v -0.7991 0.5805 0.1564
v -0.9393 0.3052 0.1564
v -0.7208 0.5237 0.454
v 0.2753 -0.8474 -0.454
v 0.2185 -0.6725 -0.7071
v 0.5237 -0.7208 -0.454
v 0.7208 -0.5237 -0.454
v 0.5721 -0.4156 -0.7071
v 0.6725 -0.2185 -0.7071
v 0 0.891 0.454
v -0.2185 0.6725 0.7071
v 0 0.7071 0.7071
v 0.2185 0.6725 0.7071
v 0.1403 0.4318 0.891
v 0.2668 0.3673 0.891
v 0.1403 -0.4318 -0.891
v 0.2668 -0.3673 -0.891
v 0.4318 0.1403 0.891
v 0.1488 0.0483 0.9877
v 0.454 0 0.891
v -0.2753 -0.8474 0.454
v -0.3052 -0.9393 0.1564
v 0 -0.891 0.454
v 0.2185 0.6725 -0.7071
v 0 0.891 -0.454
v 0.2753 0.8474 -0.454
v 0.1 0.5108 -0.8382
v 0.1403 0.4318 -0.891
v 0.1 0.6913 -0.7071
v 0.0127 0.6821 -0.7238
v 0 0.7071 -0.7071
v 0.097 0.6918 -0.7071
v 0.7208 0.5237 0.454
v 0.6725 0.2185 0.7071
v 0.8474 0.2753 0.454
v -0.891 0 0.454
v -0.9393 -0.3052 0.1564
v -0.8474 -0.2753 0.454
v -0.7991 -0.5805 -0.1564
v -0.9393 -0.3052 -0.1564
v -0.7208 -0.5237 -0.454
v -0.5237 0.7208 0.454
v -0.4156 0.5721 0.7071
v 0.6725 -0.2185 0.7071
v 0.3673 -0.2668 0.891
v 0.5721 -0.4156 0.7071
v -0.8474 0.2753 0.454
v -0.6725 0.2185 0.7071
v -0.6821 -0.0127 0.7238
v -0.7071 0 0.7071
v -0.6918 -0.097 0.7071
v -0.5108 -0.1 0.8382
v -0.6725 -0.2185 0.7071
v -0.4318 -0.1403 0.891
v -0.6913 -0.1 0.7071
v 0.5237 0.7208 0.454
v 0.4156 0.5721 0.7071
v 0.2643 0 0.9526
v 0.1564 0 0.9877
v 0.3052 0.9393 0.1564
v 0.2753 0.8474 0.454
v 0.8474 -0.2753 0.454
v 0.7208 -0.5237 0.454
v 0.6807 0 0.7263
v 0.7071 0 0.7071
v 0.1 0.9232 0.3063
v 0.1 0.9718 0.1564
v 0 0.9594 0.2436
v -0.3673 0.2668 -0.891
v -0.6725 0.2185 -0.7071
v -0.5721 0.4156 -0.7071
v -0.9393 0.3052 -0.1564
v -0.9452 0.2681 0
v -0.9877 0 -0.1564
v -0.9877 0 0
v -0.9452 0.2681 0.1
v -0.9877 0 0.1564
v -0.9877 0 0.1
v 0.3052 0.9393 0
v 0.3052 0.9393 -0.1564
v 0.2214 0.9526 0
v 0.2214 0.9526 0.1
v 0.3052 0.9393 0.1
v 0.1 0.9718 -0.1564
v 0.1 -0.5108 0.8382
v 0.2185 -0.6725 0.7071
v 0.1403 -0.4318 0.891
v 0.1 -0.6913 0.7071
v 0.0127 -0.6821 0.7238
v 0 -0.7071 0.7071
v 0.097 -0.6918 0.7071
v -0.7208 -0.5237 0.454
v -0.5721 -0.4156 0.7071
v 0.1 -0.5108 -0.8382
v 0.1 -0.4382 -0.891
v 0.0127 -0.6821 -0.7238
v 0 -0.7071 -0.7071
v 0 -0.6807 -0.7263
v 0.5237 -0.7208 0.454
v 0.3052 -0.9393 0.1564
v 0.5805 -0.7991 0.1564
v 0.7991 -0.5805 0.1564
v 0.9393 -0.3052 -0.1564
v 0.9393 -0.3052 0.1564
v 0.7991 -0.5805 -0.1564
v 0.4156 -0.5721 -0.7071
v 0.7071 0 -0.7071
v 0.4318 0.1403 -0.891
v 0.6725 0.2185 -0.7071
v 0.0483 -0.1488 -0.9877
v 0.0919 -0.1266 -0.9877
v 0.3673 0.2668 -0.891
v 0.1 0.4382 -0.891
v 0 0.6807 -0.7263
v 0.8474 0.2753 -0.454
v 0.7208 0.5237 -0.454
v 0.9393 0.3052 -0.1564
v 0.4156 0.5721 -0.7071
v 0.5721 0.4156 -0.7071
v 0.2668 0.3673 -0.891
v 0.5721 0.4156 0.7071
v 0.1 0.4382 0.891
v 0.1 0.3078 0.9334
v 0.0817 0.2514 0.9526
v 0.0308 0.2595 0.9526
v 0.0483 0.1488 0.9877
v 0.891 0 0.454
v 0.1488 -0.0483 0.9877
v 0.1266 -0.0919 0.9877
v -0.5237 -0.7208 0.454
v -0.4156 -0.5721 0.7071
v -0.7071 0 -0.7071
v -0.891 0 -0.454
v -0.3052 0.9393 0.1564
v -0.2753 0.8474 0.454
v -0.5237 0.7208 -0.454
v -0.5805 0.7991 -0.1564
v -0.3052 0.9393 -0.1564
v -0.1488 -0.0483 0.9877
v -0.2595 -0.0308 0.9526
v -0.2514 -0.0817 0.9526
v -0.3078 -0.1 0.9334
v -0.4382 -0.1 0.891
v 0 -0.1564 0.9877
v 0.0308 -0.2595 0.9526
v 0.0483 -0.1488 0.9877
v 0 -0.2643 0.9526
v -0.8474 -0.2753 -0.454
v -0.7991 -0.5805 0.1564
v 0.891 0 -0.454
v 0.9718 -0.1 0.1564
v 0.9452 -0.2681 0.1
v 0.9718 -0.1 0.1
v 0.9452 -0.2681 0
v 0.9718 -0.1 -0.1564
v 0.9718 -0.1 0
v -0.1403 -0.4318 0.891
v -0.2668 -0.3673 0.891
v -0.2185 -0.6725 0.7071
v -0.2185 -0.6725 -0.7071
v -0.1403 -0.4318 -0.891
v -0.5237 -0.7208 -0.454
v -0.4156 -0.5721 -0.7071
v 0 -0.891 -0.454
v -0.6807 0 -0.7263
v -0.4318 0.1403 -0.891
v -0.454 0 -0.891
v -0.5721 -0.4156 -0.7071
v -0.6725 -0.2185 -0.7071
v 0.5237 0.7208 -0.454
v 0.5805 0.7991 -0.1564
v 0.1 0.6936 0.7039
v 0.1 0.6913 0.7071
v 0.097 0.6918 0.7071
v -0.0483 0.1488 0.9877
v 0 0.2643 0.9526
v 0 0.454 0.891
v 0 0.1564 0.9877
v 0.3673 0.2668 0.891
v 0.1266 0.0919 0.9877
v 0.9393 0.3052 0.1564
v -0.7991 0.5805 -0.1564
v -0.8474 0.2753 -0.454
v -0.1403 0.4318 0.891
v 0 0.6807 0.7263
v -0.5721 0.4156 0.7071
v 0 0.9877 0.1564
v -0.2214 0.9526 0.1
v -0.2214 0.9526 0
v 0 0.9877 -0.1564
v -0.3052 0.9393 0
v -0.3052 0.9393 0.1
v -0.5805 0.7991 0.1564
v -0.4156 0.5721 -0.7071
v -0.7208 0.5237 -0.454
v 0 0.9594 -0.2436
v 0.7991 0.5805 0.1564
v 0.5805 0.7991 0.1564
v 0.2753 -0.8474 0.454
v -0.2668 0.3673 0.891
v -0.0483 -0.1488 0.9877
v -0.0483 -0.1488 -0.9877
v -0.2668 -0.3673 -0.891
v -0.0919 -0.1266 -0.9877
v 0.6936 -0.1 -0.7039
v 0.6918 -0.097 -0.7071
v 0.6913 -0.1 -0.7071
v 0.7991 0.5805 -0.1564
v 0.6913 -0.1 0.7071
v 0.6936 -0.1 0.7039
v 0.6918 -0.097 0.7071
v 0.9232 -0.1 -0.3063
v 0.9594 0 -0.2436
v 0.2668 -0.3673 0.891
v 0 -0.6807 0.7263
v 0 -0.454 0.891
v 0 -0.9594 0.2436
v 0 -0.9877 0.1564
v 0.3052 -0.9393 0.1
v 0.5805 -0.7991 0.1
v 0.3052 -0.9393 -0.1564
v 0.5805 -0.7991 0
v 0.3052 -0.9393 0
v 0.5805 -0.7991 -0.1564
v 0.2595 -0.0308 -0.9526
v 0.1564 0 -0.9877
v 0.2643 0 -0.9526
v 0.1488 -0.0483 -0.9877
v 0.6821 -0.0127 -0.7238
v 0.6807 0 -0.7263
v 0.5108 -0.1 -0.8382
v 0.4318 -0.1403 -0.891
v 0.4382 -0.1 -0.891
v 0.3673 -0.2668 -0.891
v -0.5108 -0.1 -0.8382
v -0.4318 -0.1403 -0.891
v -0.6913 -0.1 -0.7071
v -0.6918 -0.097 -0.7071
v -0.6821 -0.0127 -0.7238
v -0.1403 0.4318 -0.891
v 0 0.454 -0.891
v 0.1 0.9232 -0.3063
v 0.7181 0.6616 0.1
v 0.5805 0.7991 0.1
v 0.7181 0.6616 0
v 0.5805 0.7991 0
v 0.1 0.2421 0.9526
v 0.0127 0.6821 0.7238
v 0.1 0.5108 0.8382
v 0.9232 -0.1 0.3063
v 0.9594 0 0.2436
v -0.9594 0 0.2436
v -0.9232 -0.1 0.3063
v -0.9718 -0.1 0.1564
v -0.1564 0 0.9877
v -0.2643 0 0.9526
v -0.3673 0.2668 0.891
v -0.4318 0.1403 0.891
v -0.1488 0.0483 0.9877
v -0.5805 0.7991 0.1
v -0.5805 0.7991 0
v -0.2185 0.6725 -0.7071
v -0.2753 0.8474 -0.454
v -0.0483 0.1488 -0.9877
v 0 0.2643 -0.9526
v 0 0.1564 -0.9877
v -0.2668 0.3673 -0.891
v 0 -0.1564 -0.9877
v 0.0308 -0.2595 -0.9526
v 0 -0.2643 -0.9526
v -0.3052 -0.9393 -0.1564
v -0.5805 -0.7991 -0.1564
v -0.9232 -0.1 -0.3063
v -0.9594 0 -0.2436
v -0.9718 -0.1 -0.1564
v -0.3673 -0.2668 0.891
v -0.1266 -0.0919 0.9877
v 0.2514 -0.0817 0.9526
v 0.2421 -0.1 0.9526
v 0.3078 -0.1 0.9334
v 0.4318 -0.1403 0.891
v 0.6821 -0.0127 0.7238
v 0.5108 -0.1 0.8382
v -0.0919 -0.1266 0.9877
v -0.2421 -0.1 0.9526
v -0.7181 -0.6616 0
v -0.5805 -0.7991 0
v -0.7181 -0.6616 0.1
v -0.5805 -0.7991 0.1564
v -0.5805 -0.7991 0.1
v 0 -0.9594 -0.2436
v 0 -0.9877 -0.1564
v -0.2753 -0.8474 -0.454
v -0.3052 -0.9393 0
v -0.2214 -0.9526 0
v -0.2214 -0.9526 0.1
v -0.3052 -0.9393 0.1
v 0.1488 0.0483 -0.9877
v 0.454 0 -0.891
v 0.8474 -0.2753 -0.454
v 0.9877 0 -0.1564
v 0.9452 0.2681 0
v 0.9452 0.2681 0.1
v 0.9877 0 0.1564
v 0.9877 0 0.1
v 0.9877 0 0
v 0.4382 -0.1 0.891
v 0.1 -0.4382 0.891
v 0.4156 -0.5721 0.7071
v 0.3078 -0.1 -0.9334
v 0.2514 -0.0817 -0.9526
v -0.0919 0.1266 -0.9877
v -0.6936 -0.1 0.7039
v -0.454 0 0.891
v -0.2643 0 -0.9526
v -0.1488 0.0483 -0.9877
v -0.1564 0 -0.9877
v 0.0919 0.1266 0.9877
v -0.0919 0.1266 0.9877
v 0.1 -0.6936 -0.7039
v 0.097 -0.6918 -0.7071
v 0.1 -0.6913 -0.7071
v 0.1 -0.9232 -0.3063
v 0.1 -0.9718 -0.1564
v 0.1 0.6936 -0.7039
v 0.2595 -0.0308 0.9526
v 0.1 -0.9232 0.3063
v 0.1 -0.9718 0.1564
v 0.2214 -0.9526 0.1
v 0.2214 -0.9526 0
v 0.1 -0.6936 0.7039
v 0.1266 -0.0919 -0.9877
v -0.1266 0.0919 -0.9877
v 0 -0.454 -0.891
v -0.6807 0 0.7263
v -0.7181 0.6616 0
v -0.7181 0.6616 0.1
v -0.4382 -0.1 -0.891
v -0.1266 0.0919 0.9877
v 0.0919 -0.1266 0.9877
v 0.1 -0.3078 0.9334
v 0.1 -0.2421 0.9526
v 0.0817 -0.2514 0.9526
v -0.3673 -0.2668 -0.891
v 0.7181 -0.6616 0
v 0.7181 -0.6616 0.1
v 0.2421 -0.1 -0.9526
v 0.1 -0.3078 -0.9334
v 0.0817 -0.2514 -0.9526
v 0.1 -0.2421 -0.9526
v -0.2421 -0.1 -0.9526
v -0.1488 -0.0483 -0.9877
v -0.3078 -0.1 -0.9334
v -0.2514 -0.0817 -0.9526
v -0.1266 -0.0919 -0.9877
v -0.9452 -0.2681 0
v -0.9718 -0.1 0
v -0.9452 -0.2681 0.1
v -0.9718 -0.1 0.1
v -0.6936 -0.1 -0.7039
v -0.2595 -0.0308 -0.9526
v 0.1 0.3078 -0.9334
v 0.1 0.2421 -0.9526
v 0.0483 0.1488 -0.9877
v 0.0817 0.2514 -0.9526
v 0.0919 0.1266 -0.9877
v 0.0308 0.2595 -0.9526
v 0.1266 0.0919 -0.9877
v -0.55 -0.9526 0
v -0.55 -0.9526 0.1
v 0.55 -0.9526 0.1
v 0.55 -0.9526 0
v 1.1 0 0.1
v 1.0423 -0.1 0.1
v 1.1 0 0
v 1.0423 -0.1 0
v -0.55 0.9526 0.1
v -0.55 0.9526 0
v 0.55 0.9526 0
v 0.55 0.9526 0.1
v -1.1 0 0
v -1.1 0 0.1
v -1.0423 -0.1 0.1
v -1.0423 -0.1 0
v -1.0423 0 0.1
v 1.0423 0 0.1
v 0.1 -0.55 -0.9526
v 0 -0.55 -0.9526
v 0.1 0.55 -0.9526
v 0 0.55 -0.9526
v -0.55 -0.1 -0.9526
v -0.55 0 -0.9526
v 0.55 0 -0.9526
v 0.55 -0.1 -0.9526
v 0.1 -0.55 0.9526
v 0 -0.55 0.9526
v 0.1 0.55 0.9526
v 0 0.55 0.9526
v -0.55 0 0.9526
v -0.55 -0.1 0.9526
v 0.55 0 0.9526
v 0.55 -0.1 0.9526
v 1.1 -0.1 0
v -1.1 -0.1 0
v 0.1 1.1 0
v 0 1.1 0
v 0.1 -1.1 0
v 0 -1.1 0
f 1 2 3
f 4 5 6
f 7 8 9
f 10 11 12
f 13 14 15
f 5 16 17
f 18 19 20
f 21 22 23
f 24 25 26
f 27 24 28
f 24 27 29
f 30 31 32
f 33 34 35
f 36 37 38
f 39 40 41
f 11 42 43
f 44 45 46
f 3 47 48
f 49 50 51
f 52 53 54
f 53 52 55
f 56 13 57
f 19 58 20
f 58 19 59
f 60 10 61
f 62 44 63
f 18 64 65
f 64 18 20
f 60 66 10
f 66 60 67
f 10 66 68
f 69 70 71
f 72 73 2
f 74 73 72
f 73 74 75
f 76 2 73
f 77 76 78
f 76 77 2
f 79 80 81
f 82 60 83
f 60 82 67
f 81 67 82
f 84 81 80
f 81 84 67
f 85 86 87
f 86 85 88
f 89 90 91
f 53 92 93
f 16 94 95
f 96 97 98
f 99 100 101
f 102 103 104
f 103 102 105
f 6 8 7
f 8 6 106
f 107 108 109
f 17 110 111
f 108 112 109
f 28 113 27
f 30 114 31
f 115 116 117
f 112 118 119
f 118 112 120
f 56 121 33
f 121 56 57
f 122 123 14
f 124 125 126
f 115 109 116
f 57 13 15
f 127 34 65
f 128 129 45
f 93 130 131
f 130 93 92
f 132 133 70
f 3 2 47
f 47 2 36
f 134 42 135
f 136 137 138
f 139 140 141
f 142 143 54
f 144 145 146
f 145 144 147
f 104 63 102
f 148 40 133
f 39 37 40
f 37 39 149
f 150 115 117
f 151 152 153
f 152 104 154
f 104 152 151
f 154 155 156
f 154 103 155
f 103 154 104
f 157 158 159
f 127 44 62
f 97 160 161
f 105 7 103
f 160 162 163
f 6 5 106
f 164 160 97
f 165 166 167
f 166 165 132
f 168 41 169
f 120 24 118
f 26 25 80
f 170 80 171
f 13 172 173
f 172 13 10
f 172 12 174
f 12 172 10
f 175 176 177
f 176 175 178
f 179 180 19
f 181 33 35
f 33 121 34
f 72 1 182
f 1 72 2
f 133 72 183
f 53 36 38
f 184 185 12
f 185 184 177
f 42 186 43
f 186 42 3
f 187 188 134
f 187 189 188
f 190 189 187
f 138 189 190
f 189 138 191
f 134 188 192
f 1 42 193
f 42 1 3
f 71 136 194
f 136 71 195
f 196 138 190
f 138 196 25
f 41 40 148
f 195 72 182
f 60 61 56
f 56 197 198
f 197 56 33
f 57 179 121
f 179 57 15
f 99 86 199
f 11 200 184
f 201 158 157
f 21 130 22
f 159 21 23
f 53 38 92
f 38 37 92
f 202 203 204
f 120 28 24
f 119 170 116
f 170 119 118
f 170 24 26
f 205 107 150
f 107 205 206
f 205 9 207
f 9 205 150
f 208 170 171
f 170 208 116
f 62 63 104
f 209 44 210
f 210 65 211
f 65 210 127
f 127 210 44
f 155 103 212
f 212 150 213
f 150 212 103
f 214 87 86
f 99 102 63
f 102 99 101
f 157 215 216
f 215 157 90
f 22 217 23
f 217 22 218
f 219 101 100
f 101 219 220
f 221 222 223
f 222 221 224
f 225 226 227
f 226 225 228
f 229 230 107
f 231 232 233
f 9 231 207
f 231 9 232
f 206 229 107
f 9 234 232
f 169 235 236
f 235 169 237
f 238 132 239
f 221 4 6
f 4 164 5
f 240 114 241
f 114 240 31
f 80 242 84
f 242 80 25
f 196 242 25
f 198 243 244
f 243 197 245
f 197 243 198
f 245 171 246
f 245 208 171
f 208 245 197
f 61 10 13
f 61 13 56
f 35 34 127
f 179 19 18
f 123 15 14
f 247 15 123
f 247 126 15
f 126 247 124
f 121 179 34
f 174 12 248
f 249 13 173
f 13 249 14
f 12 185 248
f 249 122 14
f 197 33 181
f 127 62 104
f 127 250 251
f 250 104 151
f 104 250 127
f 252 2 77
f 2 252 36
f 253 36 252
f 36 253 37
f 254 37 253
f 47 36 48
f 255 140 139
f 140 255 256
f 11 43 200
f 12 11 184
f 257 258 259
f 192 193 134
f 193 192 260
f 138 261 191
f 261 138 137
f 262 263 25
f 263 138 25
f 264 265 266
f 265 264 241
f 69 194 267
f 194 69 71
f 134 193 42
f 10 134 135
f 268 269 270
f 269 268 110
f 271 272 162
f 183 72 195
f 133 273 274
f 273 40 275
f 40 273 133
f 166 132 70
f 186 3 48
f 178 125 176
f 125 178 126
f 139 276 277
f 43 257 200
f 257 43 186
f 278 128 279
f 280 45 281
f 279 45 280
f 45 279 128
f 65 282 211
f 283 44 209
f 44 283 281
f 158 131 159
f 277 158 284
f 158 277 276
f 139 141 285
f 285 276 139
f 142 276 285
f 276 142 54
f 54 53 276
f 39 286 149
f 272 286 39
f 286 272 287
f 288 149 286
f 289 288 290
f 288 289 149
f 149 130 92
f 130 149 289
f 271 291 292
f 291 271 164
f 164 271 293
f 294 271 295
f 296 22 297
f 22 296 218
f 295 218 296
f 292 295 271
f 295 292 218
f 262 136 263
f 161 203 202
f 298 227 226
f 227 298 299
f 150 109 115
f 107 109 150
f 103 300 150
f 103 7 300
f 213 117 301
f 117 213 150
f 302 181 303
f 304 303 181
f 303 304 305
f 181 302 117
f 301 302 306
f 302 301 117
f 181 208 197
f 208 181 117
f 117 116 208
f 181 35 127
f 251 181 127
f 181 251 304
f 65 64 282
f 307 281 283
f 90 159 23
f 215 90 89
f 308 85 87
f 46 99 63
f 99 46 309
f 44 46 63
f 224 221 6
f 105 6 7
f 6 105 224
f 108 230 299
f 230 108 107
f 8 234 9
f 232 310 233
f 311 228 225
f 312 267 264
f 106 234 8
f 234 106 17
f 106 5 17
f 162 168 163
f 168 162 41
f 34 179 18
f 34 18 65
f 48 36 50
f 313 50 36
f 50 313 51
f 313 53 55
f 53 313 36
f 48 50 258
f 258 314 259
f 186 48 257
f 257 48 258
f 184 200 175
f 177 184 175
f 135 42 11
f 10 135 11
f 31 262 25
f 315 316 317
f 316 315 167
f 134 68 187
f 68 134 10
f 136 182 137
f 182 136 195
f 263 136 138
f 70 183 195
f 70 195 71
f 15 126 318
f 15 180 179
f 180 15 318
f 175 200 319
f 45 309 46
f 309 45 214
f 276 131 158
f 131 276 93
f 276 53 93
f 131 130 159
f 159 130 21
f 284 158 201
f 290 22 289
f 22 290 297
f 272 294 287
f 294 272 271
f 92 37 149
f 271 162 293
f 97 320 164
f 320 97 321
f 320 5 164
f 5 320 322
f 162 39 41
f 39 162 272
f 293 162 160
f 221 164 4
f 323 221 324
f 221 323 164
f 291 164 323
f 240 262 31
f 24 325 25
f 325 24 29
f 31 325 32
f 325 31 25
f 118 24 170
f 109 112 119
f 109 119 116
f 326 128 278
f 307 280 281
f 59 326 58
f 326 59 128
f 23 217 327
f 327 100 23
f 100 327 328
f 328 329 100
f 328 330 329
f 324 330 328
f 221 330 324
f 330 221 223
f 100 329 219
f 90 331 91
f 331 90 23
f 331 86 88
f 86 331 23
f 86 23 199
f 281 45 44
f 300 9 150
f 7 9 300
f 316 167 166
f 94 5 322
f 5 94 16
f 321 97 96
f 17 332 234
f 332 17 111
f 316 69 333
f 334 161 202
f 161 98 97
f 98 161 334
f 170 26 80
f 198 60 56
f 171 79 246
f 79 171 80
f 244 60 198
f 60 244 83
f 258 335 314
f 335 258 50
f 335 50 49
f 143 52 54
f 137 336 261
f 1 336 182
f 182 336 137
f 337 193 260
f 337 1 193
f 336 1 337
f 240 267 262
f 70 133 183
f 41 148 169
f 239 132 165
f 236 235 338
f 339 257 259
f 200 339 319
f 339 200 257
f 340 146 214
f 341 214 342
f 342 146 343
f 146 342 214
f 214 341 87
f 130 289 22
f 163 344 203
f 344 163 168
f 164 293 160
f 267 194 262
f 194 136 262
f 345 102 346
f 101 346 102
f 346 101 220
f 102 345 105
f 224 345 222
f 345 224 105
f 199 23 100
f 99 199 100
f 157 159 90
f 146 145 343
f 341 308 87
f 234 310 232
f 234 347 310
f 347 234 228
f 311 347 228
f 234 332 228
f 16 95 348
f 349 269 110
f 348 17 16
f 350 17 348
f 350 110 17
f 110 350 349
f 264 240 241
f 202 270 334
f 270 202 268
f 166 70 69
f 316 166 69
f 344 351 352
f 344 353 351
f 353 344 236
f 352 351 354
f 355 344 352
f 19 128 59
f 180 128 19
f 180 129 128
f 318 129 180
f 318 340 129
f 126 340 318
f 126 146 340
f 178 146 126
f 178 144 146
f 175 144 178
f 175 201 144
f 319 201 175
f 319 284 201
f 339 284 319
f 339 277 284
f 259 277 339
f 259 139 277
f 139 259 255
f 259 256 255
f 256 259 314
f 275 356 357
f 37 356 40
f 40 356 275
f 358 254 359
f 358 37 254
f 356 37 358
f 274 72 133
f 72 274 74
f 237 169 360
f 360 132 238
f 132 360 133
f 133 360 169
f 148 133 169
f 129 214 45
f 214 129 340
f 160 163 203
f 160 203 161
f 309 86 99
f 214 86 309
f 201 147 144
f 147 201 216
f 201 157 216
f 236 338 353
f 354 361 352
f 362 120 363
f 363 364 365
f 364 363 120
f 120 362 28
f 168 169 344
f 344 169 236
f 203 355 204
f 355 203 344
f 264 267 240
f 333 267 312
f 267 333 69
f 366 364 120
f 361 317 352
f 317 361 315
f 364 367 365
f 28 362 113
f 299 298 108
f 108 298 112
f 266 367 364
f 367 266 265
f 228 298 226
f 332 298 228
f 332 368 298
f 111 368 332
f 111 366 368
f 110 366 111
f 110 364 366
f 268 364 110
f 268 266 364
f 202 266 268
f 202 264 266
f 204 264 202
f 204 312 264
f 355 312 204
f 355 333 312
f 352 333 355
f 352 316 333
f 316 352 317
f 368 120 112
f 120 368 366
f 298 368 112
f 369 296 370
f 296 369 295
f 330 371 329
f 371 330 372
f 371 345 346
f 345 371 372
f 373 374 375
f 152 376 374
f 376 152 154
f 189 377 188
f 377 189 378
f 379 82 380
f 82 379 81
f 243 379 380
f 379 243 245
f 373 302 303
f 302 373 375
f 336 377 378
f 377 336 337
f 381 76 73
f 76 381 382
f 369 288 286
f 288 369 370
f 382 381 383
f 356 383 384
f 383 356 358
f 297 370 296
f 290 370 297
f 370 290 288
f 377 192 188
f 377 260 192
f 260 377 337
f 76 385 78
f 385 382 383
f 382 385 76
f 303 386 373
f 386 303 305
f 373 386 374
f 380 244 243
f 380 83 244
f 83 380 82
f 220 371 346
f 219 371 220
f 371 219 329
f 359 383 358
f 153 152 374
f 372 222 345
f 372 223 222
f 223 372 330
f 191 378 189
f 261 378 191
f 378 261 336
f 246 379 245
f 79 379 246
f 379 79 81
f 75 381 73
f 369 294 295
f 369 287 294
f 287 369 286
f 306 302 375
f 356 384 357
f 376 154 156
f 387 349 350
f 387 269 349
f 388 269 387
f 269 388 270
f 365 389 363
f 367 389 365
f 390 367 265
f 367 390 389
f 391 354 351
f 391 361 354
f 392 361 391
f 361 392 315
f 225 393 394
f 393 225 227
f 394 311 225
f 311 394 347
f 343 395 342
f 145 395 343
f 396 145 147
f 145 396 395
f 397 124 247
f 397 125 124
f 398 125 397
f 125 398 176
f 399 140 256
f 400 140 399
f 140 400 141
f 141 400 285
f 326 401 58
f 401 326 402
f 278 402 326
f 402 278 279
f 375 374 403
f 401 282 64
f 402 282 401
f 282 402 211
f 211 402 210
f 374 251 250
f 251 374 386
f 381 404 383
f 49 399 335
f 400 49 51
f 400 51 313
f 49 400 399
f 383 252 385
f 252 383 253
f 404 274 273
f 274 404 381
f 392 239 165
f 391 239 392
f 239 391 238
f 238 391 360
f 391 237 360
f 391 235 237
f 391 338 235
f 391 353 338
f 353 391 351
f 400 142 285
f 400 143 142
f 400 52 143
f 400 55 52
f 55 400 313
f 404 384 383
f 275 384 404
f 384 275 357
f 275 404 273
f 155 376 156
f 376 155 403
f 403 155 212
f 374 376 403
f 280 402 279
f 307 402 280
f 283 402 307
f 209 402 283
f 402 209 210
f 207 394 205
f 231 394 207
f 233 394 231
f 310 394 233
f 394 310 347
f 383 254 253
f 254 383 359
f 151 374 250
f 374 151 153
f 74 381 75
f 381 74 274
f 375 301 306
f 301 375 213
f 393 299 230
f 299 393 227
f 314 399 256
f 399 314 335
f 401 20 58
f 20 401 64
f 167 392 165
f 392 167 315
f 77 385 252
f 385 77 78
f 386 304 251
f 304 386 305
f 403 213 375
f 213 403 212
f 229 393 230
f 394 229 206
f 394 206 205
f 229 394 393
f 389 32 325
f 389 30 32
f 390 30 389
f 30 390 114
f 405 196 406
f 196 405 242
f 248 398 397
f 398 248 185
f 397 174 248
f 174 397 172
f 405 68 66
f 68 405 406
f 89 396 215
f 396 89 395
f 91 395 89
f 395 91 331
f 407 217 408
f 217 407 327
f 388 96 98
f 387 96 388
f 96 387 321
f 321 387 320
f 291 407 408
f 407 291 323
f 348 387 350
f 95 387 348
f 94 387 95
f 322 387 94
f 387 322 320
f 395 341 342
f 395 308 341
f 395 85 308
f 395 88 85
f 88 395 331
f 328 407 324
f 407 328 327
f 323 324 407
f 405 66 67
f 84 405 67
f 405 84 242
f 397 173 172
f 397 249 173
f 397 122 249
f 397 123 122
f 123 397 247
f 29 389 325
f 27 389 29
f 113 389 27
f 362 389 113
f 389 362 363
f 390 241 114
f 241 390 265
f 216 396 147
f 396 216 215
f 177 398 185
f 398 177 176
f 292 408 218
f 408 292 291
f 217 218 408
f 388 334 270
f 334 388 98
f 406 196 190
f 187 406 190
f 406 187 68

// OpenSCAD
sphere(r=1, $fn=20);
cylinder(r=1.1, h=0.1, $fn=6);
rotate([90,0,0])
cylinder(r=1.1, h=0.1, $fn=6);
rotate([90,0,90])
cylinder(r=1.1, h=0.1, $fn=6);
